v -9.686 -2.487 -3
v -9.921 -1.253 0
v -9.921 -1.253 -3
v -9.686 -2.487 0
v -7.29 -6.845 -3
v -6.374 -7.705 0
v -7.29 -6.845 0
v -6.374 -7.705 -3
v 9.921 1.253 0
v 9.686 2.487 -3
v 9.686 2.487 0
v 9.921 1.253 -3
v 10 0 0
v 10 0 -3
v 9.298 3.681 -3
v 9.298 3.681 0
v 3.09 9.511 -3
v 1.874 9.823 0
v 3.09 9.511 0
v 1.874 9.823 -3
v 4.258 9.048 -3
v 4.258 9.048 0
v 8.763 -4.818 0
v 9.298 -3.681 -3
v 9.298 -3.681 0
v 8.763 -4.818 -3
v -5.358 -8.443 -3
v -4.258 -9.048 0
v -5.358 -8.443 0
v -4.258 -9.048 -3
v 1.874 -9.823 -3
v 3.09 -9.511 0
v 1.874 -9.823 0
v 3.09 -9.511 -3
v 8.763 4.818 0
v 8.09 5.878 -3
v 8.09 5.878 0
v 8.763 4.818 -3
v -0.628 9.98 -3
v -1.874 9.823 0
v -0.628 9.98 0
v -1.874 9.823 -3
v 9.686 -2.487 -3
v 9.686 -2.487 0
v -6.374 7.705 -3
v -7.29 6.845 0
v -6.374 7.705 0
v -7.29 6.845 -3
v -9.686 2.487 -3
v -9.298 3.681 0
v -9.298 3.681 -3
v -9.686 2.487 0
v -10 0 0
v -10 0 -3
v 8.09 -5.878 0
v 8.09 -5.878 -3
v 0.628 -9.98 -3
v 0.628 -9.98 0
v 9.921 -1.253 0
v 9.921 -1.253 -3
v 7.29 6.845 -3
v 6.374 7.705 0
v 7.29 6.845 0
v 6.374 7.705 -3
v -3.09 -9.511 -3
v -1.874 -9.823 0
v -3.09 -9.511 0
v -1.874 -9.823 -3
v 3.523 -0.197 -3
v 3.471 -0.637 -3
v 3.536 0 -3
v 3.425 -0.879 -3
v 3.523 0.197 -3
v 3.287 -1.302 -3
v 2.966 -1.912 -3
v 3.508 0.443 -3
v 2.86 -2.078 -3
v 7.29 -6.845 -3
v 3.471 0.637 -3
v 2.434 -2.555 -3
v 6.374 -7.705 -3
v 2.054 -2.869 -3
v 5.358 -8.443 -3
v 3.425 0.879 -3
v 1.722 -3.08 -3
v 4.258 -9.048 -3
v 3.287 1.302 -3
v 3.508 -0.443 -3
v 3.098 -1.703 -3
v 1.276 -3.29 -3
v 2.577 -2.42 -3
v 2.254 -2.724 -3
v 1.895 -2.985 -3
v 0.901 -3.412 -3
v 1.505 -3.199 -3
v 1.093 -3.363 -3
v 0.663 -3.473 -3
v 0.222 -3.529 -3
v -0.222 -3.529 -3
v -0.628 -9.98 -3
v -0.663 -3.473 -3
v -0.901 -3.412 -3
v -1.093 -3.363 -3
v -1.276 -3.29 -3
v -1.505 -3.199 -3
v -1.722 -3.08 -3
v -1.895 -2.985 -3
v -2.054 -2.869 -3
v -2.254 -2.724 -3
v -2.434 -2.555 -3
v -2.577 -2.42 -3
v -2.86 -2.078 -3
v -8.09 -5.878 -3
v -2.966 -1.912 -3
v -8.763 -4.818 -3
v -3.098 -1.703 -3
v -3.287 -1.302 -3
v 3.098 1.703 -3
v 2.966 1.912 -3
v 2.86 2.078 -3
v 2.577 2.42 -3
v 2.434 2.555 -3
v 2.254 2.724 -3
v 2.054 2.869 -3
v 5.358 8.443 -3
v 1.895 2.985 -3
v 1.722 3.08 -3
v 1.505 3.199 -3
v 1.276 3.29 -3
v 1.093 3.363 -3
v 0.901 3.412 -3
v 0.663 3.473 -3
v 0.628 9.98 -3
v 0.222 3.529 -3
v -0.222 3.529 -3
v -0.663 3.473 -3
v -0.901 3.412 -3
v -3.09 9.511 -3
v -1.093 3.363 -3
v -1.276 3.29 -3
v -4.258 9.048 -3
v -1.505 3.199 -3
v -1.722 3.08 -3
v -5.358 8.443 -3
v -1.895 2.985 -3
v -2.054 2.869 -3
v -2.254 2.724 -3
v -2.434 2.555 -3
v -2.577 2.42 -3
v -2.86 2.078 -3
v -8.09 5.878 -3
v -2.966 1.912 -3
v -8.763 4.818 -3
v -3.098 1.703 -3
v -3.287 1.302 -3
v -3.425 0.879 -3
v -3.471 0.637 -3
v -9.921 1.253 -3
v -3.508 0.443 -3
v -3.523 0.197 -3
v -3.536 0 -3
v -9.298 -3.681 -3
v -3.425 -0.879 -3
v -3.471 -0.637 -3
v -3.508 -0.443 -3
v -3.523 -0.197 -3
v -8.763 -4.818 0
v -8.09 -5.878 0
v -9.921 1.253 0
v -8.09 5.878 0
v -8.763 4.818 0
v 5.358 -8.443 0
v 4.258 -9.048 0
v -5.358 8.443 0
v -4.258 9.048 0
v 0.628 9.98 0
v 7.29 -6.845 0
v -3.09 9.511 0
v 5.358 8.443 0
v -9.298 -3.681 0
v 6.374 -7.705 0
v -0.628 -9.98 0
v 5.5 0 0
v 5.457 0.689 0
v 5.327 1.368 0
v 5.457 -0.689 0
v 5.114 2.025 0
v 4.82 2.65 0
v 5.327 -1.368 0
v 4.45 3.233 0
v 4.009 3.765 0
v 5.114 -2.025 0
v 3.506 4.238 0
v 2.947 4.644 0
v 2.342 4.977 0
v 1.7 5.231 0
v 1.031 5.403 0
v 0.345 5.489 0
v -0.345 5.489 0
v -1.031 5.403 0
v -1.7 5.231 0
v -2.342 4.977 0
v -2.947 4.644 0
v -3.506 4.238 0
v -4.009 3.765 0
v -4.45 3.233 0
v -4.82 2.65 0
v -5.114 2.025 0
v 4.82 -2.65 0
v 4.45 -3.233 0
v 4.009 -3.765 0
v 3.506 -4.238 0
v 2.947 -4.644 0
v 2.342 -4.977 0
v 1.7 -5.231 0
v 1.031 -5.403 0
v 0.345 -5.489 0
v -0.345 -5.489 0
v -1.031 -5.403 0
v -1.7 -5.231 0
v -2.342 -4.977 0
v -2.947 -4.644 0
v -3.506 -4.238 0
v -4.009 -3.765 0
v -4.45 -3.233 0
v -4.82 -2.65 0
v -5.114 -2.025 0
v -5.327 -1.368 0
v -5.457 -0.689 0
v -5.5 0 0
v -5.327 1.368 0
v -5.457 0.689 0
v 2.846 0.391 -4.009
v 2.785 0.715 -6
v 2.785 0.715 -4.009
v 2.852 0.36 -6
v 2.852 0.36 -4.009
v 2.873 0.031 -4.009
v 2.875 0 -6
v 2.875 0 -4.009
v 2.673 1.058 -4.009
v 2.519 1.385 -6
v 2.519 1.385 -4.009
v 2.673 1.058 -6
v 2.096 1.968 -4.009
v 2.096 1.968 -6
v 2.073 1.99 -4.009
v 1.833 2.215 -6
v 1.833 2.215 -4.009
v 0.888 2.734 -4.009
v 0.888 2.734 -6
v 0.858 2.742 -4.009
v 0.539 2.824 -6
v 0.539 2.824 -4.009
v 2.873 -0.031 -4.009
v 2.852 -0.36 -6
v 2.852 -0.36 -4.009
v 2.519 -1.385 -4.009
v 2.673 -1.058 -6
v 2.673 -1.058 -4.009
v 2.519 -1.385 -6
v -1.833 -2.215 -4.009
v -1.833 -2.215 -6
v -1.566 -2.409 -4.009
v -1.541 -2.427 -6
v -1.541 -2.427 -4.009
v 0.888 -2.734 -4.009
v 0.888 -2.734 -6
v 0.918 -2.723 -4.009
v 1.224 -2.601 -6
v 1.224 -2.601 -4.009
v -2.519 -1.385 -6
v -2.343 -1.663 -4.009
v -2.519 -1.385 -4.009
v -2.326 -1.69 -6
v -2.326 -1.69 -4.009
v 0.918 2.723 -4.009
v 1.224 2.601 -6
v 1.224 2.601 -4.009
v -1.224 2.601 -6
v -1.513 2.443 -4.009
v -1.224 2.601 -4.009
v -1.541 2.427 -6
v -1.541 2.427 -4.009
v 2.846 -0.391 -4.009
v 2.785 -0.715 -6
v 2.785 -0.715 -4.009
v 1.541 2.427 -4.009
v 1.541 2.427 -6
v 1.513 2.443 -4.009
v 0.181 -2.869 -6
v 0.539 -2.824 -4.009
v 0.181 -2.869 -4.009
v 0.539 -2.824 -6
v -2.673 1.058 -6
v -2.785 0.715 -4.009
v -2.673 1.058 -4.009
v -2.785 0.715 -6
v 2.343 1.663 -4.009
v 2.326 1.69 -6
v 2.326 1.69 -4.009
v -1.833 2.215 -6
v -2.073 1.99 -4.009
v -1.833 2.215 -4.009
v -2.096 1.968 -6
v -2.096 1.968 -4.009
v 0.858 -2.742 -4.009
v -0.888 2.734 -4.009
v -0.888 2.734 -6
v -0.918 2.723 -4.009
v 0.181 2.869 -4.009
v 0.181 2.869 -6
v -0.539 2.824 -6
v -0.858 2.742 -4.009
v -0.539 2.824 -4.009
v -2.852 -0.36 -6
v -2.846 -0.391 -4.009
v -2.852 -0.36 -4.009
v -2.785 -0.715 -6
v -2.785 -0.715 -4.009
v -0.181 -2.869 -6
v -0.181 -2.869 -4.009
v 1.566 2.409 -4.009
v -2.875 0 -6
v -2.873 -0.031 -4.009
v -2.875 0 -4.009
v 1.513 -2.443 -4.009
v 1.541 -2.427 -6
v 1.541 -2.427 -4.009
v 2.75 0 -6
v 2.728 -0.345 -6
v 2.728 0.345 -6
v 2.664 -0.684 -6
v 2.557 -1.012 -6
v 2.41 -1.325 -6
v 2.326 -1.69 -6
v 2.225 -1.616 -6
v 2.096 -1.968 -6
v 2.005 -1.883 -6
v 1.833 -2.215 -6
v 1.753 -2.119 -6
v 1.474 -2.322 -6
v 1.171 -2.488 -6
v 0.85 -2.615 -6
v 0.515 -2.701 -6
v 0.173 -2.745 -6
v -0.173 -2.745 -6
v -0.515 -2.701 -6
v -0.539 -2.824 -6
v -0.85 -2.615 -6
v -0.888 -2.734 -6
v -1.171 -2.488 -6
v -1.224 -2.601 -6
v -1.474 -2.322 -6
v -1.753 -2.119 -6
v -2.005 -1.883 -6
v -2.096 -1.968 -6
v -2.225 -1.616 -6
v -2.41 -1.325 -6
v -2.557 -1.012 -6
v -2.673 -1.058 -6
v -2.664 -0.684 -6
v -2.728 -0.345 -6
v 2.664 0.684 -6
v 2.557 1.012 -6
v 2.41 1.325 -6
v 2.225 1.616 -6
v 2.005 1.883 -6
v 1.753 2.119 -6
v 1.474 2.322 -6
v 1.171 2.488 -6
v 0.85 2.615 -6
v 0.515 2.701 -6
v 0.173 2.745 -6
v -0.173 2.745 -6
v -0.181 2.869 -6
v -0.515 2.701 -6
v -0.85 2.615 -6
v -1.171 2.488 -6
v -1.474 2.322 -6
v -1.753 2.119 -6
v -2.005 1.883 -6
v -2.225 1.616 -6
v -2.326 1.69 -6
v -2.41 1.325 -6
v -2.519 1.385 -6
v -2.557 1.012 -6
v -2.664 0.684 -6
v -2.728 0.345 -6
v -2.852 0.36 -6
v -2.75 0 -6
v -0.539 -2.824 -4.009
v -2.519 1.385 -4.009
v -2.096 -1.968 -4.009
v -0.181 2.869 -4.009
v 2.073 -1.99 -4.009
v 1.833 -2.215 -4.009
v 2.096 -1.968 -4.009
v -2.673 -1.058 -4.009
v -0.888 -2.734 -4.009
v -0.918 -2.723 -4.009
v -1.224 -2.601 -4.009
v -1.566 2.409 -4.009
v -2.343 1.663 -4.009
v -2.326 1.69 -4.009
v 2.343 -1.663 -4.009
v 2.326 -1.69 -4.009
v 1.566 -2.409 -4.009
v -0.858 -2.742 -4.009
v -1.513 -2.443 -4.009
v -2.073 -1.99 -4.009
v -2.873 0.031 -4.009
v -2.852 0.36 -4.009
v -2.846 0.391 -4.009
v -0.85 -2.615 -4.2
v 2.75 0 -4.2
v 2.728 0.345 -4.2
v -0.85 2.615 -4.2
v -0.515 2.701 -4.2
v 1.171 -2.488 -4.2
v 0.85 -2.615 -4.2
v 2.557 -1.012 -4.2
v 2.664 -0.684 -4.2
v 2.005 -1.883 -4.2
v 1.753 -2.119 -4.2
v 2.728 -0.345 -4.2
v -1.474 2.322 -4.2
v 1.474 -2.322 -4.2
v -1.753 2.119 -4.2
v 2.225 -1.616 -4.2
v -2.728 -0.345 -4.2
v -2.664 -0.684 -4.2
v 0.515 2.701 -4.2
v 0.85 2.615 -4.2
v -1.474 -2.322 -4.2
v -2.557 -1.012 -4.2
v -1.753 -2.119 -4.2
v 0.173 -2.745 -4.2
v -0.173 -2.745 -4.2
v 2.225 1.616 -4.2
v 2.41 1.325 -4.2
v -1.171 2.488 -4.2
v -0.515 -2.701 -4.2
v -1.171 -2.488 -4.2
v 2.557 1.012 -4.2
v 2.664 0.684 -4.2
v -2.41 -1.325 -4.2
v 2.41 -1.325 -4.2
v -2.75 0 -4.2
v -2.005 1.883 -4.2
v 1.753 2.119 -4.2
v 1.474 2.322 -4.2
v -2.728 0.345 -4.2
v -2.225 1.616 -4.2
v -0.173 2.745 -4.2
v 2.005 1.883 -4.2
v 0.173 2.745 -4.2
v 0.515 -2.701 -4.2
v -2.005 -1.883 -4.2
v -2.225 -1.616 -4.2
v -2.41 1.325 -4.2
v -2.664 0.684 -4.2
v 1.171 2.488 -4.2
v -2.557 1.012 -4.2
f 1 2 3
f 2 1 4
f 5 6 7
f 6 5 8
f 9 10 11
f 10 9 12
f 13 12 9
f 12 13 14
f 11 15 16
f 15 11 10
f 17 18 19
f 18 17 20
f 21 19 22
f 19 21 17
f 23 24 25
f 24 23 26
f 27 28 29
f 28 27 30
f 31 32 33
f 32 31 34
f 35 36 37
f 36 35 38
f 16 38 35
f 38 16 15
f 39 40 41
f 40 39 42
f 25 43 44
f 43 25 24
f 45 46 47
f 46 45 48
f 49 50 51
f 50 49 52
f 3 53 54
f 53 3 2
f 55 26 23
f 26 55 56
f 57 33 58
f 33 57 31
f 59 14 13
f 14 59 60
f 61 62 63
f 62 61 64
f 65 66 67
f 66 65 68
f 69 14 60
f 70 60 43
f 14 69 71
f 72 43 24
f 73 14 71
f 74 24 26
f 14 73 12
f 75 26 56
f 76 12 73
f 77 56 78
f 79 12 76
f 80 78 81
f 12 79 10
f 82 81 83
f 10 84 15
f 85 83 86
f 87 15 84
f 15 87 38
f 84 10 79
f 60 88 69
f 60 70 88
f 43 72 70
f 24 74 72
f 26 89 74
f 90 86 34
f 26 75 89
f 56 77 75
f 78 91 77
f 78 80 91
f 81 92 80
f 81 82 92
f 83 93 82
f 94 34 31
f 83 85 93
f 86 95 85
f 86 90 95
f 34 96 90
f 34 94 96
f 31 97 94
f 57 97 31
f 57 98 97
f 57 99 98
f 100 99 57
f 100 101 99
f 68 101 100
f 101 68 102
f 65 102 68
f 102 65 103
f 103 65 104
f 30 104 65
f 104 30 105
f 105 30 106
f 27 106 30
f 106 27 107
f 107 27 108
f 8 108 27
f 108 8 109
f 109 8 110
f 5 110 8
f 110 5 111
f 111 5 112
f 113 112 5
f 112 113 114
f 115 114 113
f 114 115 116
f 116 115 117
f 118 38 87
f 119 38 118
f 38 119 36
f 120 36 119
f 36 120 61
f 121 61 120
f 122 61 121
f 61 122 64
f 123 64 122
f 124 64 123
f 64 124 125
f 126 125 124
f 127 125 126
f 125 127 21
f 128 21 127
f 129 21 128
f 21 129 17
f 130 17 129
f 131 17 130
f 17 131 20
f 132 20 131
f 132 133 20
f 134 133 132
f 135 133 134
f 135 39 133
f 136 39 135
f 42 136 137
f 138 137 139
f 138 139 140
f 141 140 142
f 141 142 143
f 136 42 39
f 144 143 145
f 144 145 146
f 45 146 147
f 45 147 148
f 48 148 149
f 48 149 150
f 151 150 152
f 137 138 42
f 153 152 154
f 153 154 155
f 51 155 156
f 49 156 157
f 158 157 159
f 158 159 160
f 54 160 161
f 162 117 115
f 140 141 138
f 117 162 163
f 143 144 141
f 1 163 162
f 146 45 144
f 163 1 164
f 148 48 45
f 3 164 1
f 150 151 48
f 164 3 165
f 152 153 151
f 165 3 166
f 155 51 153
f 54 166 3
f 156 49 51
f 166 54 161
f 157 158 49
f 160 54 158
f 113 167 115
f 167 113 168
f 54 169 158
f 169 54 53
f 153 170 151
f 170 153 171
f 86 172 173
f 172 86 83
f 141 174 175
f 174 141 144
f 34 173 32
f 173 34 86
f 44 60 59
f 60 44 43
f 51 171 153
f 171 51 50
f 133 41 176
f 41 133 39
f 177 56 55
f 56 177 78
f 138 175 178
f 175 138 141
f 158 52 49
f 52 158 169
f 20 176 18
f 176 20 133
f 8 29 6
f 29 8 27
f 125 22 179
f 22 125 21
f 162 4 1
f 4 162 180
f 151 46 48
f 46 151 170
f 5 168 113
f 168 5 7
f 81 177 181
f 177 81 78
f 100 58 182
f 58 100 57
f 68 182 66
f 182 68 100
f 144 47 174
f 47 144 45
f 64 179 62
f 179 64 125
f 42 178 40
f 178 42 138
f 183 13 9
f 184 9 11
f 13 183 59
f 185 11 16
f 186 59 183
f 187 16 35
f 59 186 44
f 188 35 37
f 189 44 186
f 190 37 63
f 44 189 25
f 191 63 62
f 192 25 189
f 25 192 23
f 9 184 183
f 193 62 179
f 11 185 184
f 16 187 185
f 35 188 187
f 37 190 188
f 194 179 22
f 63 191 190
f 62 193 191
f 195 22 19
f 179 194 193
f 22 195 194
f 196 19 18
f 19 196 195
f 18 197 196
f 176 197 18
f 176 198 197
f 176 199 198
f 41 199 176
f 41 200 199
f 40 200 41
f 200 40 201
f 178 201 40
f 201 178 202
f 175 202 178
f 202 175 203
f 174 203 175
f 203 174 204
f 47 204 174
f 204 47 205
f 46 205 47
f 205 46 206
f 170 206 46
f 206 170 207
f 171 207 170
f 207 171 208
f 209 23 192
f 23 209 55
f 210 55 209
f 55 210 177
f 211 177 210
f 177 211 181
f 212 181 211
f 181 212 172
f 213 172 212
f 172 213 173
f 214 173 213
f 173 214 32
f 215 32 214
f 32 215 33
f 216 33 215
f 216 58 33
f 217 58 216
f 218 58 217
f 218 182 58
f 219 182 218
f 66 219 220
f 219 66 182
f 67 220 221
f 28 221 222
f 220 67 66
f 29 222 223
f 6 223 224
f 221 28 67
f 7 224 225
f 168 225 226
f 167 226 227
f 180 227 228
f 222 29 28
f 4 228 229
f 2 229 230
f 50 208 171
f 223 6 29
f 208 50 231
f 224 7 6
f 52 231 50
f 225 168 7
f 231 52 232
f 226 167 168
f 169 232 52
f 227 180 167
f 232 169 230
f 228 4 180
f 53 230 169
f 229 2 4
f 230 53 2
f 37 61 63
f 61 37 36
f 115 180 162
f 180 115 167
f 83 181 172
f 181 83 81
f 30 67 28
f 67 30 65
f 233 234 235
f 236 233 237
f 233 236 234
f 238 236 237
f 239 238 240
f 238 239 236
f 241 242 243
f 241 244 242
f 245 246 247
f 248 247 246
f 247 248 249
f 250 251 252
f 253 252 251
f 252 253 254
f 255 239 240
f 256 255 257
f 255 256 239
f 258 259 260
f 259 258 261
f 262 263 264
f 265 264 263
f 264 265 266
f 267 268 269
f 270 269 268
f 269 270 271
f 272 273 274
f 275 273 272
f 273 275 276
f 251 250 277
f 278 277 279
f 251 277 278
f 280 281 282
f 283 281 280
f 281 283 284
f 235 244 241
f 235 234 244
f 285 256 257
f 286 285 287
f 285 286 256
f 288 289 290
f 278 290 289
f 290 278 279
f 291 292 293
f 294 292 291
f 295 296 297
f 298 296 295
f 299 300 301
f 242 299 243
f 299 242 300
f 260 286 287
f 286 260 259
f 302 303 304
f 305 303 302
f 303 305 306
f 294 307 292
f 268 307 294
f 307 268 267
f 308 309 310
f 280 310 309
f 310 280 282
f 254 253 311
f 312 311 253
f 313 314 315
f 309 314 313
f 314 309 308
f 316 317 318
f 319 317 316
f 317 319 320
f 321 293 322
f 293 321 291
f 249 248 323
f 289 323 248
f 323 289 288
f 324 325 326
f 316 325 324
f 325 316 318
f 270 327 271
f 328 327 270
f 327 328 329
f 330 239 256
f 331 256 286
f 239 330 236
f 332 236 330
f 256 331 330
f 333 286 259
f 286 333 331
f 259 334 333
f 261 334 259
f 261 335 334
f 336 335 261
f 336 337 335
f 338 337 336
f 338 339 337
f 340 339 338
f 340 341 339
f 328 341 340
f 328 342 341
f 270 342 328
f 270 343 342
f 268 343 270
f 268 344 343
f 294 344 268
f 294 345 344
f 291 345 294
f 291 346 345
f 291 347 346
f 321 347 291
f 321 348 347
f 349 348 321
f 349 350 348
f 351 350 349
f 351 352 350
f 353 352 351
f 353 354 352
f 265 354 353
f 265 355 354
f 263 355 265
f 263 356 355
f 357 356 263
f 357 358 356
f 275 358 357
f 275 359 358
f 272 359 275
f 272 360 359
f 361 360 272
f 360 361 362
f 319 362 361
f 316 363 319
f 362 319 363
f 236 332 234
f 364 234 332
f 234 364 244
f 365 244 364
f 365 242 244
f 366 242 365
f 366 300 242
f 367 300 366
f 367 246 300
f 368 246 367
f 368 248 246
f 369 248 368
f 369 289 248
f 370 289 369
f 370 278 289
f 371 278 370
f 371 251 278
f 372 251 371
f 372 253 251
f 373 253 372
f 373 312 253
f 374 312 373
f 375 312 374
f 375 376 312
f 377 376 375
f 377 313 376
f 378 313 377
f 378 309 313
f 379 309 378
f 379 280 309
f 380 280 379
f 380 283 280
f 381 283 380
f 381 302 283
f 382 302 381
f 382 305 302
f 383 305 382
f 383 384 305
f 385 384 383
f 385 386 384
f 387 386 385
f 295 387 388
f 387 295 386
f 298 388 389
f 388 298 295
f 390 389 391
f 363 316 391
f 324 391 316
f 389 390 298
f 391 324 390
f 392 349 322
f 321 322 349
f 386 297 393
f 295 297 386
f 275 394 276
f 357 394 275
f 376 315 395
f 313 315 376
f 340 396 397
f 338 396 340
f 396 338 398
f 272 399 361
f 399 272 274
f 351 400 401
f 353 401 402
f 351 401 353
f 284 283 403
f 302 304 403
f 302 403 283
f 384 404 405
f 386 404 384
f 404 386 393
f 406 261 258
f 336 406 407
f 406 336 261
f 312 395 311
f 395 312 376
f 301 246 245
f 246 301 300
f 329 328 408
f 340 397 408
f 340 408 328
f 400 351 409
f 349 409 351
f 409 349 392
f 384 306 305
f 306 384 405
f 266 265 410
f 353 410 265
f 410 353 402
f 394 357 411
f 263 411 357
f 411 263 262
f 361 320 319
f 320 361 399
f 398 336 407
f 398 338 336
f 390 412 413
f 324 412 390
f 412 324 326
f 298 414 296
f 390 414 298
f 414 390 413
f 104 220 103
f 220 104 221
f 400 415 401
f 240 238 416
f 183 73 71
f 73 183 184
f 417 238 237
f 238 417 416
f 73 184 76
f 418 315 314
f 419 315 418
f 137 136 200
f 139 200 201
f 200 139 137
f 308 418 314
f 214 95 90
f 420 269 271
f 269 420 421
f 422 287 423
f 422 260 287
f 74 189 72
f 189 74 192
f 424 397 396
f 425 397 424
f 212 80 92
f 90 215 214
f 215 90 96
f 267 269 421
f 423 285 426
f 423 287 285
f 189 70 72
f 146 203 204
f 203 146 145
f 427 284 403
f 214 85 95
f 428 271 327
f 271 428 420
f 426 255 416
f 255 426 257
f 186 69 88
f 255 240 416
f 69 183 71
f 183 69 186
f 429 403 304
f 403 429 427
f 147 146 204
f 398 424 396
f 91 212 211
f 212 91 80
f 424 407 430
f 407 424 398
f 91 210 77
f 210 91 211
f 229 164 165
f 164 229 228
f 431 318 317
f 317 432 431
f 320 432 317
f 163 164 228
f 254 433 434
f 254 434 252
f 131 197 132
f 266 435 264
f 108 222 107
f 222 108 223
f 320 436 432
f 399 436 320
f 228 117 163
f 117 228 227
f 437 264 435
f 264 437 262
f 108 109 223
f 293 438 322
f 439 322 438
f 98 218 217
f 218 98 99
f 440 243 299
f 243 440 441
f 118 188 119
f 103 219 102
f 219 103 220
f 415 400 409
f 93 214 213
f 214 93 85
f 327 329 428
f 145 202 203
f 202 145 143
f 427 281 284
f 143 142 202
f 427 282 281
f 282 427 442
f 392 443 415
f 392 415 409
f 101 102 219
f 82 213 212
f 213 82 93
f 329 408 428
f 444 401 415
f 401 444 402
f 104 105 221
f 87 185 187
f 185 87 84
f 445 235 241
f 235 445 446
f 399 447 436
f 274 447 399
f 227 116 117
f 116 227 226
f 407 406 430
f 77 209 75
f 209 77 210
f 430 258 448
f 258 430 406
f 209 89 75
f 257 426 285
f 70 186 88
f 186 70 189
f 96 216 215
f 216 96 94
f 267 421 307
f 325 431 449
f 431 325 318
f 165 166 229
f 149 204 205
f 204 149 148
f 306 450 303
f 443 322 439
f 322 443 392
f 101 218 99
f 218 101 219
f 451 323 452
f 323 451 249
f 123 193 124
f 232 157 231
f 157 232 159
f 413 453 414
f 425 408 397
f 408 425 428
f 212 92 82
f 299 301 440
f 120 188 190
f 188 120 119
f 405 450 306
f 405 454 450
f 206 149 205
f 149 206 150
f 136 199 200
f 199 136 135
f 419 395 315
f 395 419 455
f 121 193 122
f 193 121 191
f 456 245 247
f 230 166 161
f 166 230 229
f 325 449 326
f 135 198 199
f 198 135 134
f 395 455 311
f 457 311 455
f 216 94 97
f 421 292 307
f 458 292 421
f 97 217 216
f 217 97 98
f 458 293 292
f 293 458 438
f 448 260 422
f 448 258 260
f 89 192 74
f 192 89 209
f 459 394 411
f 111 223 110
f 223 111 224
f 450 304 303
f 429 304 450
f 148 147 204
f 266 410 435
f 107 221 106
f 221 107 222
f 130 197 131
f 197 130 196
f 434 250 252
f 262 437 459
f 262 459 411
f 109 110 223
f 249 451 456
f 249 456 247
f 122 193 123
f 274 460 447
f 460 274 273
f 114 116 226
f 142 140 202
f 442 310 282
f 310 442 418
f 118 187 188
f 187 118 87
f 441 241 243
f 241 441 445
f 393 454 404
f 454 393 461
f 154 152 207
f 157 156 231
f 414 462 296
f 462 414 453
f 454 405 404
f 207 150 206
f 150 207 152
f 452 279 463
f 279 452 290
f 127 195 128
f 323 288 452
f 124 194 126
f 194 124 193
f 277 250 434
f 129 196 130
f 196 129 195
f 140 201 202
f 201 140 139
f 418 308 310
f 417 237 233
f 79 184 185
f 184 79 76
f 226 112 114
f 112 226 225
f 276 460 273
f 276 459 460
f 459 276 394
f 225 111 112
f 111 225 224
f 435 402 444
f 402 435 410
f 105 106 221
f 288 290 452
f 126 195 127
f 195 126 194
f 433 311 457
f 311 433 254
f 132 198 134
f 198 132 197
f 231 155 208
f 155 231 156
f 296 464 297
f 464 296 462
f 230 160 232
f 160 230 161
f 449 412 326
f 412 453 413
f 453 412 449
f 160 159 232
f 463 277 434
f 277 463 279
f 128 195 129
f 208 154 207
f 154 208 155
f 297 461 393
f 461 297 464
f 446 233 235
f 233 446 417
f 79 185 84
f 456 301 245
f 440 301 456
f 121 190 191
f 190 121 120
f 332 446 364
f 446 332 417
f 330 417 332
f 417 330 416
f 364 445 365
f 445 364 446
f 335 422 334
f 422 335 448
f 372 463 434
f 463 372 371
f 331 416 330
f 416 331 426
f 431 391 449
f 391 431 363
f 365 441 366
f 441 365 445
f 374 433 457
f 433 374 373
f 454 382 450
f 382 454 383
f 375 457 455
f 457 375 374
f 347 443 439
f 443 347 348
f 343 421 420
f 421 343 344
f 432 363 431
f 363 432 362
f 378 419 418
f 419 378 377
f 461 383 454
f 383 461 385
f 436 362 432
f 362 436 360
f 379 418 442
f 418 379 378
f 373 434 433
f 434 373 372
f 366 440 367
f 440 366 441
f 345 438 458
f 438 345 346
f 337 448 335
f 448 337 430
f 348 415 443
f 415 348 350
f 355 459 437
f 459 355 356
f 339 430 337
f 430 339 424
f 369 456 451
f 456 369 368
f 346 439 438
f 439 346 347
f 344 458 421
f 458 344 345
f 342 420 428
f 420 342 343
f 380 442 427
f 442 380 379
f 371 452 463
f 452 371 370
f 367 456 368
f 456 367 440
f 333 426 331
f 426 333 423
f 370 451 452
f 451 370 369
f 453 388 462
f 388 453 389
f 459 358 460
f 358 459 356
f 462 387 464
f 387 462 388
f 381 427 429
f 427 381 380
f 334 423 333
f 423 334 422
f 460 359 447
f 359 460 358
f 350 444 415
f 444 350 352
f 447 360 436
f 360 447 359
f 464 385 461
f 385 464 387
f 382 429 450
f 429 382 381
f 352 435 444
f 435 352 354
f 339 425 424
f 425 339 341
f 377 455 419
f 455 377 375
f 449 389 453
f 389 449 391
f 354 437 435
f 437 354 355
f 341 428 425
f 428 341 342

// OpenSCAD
$fn = 50;

difference() {
	union() {
		translate(v = [0, 0, -3.0]) {
			cylinder(h = 3, r = 10.0);
		}
		#translate(v = [0, 0, -6.0]) {
			cylinder(h = 6, r = 2.875);
		}
	}
	union() {
		translate(v = [0, 0, 0]) {
			rotate(a = [0, 0, 0]) {
				difference() {
					union() {
						translate(v = [0, 0, -6.0]) {
							cylinder(h = 6, r = 2.25);
						}
						translate(v = [0, 0, -4.2]) {
							cylinder(h = 4.2, r1 = 2.75, r2 = 5.5);
						}
						translate(v = [0, 0, -6.0]) {
							cylinder(h = 6, r = 2.75);
						}
						translate(v = [0, 0, -6.0]) {
							cylinder(h = 6, r = 2.25);
						}
					}
					union();
				}
			}
		}
	}
}
